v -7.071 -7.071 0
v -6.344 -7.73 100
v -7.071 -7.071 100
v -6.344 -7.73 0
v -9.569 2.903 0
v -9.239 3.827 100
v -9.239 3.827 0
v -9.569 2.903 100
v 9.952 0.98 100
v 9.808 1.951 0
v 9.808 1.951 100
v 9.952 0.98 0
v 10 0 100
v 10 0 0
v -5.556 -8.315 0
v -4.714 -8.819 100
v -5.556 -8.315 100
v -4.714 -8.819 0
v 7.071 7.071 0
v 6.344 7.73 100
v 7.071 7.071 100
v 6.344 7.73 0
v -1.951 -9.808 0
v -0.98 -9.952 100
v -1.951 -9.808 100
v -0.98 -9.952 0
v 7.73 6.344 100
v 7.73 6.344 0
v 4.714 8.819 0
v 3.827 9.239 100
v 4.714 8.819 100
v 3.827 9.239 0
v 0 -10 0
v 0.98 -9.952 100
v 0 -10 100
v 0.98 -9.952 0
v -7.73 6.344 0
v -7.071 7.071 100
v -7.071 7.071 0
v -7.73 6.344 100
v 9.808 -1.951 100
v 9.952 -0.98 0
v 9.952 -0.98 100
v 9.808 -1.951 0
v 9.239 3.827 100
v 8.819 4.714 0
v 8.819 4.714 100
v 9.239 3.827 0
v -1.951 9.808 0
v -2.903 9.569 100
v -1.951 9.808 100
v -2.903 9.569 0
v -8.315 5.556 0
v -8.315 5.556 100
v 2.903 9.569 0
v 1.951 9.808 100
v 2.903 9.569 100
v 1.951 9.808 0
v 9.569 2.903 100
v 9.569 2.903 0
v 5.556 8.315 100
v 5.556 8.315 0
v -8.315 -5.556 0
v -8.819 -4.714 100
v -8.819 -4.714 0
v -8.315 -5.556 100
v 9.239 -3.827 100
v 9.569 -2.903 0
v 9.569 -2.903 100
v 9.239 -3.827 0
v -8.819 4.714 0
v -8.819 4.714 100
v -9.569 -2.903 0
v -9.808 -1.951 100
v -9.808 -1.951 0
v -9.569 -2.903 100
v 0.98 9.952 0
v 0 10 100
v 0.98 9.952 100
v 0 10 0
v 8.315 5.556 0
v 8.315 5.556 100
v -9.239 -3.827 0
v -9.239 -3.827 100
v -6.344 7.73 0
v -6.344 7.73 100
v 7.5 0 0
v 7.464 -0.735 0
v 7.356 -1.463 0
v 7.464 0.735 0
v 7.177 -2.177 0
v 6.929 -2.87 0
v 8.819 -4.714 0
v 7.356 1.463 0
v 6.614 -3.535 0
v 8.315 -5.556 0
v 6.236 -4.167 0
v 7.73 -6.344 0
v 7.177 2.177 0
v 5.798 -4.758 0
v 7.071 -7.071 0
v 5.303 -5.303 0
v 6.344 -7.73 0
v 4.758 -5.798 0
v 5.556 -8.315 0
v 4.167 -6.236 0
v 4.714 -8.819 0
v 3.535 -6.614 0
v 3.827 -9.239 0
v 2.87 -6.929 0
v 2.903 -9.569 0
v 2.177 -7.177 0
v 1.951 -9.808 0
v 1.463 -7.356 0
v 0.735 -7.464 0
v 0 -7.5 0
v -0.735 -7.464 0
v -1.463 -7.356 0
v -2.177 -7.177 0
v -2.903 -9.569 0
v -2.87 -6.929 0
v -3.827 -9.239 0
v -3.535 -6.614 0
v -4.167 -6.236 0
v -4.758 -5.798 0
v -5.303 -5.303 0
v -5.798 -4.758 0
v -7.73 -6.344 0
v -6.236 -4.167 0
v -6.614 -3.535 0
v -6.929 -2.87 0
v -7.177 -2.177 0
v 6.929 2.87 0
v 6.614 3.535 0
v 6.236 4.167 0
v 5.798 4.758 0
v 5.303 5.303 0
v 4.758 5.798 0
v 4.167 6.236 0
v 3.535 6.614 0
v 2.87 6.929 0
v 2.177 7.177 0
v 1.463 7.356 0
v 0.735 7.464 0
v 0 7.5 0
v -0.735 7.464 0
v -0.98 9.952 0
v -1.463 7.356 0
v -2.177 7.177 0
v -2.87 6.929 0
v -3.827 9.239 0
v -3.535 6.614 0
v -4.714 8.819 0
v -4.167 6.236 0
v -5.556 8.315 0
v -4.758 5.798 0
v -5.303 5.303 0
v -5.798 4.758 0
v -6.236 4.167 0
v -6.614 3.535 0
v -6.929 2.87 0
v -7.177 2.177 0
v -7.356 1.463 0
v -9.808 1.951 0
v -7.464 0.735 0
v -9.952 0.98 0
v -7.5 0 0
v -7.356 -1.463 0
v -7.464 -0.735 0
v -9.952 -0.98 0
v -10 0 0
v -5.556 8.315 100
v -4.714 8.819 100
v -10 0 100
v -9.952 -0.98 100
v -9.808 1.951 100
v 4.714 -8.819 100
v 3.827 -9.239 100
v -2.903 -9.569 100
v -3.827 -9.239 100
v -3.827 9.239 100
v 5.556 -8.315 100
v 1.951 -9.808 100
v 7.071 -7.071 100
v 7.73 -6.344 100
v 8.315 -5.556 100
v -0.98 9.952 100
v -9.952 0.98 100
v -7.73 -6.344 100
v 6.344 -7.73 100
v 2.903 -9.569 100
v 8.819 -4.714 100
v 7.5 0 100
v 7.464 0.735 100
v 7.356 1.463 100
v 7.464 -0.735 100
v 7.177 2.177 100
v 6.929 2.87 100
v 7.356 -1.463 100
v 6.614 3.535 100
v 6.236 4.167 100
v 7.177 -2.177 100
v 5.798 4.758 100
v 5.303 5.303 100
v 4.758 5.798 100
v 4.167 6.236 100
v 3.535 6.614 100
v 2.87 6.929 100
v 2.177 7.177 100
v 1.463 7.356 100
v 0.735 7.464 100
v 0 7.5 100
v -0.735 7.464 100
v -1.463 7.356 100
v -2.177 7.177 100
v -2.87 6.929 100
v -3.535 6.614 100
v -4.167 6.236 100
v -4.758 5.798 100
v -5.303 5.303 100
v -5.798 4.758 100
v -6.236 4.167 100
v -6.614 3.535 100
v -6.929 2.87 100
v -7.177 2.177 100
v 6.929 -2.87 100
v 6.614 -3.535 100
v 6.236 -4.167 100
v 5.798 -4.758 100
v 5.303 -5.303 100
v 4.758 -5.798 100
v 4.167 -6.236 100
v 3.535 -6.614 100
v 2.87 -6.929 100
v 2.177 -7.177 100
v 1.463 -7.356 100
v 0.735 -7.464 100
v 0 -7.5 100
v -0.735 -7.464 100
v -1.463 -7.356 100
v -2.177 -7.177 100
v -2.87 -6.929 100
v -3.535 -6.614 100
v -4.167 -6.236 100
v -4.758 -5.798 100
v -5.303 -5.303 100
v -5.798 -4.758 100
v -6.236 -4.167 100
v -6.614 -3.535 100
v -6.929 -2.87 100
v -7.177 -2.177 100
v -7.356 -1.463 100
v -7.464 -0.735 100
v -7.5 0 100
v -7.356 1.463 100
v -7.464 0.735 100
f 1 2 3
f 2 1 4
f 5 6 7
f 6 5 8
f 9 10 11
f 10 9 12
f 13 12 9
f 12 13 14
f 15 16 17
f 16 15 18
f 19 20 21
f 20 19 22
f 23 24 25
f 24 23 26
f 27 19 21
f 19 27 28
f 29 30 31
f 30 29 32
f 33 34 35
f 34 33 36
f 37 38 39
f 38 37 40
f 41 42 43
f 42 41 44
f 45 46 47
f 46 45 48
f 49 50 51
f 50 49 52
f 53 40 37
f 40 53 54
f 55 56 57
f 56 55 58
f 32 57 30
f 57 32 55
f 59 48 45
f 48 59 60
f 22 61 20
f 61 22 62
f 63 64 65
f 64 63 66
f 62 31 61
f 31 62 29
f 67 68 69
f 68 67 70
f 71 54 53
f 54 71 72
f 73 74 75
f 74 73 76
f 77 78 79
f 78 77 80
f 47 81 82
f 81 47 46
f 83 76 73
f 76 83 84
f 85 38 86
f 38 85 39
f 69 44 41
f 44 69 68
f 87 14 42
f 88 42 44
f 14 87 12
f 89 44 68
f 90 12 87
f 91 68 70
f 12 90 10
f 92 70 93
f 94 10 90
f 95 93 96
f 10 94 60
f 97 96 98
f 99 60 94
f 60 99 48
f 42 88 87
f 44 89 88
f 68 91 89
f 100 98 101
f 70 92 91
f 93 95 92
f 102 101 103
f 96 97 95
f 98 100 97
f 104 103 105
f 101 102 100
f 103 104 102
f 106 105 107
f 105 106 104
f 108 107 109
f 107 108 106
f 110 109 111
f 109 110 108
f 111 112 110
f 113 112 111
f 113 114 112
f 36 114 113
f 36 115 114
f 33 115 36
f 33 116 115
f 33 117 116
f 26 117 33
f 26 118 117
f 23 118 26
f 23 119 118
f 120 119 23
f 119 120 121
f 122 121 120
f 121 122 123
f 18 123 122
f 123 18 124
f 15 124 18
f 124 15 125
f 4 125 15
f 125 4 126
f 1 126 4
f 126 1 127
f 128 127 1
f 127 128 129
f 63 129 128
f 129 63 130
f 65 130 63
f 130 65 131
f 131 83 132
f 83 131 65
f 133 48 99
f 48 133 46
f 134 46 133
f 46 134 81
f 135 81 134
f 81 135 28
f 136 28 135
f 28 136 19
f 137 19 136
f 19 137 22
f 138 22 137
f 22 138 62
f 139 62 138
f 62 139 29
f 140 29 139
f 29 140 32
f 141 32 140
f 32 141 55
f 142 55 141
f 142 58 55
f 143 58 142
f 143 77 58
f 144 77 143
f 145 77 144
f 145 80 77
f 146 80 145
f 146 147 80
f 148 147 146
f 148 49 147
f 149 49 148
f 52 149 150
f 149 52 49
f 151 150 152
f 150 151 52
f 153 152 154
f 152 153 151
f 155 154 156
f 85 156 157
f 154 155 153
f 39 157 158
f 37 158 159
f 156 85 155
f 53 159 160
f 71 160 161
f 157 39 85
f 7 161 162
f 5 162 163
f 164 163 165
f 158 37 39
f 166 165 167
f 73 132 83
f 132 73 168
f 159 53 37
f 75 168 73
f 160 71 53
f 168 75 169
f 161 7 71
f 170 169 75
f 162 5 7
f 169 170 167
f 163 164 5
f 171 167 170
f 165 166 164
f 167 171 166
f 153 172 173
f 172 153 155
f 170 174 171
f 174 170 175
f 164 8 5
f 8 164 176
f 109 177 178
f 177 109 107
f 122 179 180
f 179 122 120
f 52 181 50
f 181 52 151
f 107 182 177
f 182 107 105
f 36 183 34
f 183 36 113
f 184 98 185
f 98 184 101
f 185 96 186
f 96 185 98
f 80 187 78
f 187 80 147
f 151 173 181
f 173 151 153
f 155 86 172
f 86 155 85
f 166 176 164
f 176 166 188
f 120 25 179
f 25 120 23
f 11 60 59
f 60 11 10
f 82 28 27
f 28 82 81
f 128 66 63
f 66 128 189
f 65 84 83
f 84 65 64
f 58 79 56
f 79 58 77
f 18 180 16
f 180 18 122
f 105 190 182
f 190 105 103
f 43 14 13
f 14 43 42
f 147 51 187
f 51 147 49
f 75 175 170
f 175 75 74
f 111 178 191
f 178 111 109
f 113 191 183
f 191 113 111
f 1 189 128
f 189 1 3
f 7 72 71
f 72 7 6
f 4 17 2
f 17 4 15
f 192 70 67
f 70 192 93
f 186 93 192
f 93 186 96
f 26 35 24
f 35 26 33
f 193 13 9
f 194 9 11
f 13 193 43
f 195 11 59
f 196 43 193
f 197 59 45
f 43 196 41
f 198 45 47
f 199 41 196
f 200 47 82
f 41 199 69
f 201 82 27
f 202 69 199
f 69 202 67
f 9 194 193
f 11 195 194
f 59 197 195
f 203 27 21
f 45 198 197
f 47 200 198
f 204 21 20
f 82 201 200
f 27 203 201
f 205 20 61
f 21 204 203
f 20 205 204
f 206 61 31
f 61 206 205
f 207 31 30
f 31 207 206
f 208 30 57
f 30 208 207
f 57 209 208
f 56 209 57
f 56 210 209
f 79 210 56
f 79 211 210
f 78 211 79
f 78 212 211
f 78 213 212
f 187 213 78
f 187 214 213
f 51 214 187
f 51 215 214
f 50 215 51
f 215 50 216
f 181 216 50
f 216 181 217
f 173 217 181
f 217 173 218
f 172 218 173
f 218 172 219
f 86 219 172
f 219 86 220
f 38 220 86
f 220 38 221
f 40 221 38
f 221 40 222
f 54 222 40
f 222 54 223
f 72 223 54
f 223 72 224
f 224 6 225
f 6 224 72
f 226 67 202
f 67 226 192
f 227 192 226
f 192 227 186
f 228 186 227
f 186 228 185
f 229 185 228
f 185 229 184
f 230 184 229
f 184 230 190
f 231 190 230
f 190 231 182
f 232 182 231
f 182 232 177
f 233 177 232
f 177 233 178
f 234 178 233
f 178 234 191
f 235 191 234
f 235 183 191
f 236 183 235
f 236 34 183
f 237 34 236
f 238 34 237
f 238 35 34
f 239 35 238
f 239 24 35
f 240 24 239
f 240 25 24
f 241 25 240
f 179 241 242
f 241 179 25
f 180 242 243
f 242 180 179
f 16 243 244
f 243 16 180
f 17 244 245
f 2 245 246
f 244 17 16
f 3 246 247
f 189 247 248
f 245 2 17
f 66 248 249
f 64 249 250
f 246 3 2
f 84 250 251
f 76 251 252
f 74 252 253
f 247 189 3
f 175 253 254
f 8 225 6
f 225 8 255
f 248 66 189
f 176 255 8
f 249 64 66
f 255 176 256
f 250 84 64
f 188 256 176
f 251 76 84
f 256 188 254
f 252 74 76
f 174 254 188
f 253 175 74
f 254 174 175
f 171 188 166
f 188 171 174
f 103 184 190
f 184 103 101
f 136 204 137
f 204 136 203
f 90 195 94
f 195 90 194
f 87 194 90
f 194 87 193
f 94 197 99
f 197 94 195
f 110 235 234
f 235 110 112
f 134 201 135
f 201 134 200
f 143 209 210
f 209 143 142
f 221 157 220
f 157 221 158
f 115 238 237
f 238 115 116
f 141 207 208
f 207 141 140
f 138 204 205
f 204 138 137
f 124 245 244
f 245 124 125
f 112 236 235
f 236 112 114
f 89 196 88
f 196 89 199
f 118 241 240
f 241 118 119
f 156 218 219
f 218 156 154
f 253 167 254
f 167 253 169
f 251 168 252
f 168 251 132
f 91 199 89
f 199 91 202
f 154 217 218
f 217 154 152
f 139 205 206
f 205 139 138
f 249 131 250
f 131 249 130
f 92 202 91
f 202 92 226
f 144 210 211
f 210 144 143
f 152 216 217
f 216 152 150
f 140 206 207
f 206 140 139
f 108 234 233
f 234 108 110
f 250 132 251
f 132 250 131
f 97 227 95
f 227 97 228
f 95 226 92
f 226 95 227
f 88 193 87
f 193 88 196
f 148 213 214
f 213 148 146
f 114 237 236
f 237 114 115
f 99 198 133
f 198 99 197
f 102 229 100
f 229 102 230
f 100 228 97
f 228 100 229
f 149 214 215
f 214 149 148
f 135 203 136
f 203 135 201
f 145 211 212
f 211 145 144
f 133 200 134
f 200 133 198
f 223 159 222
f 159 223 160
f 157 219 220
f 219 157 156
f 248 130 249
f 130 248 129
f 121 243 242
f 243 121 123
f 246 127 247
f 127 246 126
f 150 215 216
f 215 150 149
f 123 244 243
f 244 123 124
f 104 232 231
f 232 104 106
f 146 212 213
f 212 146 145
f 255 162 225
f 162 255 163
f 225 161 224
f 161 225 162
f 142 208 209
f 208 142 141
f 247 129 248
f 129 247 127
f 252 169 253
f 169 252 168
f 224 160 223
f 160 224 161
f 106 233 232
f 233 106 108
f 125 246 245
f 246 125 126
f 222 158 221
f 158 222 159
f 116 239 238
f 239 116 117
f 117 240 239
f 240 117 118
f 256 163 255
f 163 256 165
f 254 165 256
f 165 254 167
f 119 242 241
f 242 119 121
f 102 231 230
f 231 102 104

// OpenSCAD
module neoprene_tubing(outer_diameter=20, inner_diameter=15, length=100) {
    difference() {
        cylinder(h=length, d=outer_diameter, $fn=64);
        translate([0, 0, -1])
            cylinder(h=length + 2, d=inner_diameter, $fn=64);
    }
}

neoprene_tubing();
